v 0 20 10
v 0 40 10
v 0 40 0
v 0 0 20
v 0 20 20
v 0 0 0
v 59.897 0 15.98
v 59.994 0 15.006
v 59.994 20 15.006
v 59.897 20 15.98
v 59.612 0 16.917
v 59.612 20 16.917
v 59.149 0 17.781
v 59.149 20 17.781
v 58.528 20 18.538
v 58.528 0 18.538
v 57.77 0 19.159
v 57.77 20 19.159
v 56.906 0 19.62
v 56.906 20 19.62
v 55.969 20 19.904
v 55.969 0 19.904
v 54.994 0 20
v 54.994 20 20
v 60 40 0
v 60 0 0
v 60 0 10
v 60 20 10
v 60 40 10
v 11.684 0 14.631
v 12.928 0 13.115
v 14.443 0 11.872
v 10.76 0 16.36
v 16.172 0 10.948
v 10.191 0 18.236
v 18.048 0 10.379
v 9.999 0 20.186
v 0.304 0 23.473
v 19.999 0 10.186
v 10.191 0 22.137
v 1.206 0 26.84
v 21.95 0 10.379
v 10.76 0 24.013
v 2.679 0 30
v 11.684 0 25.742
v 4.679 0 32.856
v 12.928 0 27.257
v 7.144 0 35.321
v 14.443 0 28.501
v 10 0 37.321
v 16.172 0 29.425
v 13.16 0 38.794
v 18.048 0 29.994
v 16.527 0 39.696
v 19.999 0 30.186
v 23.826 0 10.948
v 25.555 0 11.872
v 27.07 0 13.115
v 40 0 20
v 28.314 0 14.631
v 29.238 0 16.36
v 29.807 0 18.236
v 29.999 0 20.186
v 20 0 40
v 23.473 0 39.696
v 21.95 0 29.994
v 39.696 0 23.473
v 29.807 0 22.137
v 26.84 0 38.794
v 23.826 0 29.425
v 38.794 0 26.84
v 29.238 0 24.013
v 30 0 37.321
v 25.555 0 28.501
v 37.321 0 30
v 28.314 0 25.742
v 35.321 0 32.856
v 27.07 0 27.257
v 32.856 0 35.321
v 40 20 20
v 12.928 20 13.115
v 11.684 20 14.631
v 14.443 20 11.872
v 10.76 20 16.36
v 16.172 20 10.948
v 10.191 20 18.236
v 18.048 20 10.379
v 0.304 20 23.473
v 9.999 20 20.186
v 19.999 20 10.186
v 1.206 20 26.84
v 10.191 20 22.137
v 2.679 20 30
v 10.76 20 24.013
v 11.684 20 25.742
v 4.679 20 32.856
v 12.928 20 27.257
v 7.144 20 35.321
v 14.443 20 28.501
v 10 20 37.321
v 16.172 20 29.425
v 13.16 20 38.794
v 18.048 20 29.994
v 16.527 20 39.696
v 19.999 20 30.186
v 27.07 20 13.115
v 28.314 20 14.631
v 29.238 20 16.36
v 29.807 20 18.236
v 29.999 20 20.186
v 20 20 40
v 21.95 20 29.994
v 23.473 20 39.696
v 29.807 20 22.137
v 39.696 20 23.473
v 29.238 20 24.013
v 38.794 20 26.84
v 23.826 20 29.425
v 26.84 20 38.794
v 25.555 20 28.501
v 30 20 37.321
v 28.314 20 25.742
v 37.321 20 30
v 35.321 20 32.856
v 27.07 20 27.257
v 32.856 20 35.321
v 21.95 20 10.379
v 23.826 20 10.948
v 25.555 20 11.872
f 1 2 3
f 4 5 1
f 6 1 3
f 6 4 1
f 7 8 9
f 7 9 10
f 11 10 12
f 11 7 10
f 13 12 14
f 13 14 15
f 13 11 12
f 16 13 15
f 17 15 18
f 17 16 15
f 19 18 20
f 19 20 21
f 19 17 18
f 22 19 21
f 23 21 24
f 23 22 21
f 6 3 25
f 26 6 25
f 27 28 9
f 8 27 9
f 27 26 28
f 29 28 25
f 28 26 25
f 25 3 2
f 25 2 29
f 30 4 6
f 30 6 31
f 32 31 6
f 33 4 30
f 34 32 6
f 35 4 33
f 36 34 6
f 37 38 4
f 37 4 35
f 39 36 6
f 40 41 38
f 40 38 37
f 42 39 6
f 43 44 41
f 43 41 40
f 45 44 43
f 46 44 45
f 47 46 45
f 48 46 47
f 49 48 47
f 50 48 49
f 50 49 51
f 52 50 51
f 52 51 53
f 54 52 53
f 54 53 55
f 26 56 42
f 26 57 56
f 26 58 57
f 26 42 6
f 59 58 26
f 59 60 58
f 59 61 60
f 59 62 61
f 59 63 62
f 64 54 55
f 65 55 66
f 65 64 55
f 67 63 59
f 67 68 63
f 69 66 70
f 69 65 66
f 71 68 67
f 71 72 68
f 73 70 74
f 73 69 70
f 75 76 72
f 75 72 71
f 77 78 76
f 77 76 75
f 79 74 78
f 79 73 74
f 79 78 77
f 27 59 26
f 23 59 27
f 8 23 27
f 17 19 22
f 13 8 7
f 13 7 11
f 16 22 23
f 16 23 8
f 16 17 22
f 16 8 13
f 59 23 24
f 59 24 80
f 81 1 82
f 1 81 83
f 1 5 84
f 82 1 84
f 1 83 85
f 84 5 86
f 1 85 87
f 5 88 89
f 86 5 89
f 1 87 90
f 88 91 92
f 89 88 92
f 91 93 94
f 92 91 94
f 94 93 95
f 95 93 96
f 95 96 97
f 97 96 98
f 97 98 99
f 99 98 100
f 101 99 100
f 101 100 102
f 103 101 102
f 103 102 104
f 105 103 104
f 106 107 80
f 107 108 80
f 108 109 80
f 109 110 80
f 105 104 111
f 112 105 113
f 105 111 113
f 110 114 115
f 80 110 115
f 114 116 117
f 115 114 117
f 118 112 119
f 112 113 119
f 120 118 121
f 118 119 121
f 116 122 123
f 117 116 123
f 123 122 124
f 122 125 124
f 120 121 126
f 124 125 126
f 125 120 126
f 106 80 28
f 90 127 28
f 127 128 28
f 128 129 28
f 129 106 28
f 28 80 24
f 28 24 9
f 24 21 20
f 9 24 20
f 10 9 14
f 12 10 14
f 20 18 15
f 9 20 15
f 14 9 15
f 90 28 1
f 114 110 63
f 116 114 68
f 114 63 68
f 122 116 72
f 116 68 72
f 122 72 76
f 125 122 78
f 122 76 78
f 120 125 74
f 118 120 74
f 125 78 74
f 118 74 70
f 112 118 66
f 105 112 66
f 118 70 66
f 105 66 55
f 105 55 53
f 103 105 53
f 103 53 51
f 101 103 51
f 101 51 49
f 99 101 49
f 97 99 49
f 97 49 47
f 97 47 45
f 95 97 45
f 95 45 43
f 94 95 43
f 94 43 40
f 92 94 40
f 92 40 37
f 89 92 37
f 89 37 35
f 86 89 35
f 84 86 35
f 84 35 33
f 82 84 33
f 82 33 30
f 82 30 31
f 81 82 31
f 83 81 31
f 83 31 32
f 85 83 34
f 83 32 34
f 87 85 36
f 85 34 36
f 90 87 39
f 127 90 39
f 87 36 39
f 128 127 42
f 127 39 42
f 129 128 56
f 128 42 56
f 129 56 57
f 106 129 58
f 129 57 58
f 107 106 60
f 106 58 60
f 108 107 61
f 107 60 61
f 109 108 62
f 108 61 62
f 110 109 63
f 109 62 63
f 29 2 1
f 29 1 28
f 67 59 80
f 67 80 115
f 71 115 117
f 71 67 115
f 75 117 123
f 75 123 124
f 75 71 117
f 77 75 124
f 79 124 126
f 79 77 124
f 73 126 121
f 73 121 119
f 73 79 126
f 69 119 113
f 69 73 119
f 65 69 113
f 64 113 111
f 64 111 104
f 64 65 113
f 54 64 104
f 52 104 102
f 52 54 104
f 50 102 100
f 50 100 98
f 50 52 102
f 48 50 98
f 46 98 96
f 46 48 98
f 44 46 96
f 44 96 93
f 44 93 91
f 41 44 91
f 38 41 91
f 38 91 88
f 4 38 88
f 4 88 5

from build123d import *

# Parameters (mm, degrees)
F0_W     = 60
F0_H     = 40
F1_DEPTH = 10
F3_DEPTH = 20
F4_R     = 10
F5_DEPTH = 25


with BuildPart() as f1:
    # F0 (on Top) → F1 (new body)
    with BuildSketch(Plane.XY):
        with Locations((30, 20)):
            Rectangle(F0_W, F0_H)
    extrude(amount=F1_DEPTH)

    # F2 (on face) → F3 (join)
    with BuildSketch(Plane.XZ):
        with BuildLine():
            Line((54.994119, 20), (40, 20))
            ThreePointArc((40, 20), (20, 40), (0, 20))
            Line((0, 20), (0, 10))
            Line((0, 10), (60, 10))
            Line((60, 10), (59.994116, 15.005877))
            ThreePointArc((59.994116, 15.005877), (58.527575, 18.537611), (54.994119, 20))
        make_face()
    extrude(amount=-F3_DEPTH)

    # F4 (on Front) → F5 (cut)
    with BuildSketch(Plane.XZ):
        with Locations((19.999131, 20.18641)):
            Circle(F4_R)
    extrude(amount=-F5_DEPTH, mode=Mode.SUBTRACT)


solid = f1.part
